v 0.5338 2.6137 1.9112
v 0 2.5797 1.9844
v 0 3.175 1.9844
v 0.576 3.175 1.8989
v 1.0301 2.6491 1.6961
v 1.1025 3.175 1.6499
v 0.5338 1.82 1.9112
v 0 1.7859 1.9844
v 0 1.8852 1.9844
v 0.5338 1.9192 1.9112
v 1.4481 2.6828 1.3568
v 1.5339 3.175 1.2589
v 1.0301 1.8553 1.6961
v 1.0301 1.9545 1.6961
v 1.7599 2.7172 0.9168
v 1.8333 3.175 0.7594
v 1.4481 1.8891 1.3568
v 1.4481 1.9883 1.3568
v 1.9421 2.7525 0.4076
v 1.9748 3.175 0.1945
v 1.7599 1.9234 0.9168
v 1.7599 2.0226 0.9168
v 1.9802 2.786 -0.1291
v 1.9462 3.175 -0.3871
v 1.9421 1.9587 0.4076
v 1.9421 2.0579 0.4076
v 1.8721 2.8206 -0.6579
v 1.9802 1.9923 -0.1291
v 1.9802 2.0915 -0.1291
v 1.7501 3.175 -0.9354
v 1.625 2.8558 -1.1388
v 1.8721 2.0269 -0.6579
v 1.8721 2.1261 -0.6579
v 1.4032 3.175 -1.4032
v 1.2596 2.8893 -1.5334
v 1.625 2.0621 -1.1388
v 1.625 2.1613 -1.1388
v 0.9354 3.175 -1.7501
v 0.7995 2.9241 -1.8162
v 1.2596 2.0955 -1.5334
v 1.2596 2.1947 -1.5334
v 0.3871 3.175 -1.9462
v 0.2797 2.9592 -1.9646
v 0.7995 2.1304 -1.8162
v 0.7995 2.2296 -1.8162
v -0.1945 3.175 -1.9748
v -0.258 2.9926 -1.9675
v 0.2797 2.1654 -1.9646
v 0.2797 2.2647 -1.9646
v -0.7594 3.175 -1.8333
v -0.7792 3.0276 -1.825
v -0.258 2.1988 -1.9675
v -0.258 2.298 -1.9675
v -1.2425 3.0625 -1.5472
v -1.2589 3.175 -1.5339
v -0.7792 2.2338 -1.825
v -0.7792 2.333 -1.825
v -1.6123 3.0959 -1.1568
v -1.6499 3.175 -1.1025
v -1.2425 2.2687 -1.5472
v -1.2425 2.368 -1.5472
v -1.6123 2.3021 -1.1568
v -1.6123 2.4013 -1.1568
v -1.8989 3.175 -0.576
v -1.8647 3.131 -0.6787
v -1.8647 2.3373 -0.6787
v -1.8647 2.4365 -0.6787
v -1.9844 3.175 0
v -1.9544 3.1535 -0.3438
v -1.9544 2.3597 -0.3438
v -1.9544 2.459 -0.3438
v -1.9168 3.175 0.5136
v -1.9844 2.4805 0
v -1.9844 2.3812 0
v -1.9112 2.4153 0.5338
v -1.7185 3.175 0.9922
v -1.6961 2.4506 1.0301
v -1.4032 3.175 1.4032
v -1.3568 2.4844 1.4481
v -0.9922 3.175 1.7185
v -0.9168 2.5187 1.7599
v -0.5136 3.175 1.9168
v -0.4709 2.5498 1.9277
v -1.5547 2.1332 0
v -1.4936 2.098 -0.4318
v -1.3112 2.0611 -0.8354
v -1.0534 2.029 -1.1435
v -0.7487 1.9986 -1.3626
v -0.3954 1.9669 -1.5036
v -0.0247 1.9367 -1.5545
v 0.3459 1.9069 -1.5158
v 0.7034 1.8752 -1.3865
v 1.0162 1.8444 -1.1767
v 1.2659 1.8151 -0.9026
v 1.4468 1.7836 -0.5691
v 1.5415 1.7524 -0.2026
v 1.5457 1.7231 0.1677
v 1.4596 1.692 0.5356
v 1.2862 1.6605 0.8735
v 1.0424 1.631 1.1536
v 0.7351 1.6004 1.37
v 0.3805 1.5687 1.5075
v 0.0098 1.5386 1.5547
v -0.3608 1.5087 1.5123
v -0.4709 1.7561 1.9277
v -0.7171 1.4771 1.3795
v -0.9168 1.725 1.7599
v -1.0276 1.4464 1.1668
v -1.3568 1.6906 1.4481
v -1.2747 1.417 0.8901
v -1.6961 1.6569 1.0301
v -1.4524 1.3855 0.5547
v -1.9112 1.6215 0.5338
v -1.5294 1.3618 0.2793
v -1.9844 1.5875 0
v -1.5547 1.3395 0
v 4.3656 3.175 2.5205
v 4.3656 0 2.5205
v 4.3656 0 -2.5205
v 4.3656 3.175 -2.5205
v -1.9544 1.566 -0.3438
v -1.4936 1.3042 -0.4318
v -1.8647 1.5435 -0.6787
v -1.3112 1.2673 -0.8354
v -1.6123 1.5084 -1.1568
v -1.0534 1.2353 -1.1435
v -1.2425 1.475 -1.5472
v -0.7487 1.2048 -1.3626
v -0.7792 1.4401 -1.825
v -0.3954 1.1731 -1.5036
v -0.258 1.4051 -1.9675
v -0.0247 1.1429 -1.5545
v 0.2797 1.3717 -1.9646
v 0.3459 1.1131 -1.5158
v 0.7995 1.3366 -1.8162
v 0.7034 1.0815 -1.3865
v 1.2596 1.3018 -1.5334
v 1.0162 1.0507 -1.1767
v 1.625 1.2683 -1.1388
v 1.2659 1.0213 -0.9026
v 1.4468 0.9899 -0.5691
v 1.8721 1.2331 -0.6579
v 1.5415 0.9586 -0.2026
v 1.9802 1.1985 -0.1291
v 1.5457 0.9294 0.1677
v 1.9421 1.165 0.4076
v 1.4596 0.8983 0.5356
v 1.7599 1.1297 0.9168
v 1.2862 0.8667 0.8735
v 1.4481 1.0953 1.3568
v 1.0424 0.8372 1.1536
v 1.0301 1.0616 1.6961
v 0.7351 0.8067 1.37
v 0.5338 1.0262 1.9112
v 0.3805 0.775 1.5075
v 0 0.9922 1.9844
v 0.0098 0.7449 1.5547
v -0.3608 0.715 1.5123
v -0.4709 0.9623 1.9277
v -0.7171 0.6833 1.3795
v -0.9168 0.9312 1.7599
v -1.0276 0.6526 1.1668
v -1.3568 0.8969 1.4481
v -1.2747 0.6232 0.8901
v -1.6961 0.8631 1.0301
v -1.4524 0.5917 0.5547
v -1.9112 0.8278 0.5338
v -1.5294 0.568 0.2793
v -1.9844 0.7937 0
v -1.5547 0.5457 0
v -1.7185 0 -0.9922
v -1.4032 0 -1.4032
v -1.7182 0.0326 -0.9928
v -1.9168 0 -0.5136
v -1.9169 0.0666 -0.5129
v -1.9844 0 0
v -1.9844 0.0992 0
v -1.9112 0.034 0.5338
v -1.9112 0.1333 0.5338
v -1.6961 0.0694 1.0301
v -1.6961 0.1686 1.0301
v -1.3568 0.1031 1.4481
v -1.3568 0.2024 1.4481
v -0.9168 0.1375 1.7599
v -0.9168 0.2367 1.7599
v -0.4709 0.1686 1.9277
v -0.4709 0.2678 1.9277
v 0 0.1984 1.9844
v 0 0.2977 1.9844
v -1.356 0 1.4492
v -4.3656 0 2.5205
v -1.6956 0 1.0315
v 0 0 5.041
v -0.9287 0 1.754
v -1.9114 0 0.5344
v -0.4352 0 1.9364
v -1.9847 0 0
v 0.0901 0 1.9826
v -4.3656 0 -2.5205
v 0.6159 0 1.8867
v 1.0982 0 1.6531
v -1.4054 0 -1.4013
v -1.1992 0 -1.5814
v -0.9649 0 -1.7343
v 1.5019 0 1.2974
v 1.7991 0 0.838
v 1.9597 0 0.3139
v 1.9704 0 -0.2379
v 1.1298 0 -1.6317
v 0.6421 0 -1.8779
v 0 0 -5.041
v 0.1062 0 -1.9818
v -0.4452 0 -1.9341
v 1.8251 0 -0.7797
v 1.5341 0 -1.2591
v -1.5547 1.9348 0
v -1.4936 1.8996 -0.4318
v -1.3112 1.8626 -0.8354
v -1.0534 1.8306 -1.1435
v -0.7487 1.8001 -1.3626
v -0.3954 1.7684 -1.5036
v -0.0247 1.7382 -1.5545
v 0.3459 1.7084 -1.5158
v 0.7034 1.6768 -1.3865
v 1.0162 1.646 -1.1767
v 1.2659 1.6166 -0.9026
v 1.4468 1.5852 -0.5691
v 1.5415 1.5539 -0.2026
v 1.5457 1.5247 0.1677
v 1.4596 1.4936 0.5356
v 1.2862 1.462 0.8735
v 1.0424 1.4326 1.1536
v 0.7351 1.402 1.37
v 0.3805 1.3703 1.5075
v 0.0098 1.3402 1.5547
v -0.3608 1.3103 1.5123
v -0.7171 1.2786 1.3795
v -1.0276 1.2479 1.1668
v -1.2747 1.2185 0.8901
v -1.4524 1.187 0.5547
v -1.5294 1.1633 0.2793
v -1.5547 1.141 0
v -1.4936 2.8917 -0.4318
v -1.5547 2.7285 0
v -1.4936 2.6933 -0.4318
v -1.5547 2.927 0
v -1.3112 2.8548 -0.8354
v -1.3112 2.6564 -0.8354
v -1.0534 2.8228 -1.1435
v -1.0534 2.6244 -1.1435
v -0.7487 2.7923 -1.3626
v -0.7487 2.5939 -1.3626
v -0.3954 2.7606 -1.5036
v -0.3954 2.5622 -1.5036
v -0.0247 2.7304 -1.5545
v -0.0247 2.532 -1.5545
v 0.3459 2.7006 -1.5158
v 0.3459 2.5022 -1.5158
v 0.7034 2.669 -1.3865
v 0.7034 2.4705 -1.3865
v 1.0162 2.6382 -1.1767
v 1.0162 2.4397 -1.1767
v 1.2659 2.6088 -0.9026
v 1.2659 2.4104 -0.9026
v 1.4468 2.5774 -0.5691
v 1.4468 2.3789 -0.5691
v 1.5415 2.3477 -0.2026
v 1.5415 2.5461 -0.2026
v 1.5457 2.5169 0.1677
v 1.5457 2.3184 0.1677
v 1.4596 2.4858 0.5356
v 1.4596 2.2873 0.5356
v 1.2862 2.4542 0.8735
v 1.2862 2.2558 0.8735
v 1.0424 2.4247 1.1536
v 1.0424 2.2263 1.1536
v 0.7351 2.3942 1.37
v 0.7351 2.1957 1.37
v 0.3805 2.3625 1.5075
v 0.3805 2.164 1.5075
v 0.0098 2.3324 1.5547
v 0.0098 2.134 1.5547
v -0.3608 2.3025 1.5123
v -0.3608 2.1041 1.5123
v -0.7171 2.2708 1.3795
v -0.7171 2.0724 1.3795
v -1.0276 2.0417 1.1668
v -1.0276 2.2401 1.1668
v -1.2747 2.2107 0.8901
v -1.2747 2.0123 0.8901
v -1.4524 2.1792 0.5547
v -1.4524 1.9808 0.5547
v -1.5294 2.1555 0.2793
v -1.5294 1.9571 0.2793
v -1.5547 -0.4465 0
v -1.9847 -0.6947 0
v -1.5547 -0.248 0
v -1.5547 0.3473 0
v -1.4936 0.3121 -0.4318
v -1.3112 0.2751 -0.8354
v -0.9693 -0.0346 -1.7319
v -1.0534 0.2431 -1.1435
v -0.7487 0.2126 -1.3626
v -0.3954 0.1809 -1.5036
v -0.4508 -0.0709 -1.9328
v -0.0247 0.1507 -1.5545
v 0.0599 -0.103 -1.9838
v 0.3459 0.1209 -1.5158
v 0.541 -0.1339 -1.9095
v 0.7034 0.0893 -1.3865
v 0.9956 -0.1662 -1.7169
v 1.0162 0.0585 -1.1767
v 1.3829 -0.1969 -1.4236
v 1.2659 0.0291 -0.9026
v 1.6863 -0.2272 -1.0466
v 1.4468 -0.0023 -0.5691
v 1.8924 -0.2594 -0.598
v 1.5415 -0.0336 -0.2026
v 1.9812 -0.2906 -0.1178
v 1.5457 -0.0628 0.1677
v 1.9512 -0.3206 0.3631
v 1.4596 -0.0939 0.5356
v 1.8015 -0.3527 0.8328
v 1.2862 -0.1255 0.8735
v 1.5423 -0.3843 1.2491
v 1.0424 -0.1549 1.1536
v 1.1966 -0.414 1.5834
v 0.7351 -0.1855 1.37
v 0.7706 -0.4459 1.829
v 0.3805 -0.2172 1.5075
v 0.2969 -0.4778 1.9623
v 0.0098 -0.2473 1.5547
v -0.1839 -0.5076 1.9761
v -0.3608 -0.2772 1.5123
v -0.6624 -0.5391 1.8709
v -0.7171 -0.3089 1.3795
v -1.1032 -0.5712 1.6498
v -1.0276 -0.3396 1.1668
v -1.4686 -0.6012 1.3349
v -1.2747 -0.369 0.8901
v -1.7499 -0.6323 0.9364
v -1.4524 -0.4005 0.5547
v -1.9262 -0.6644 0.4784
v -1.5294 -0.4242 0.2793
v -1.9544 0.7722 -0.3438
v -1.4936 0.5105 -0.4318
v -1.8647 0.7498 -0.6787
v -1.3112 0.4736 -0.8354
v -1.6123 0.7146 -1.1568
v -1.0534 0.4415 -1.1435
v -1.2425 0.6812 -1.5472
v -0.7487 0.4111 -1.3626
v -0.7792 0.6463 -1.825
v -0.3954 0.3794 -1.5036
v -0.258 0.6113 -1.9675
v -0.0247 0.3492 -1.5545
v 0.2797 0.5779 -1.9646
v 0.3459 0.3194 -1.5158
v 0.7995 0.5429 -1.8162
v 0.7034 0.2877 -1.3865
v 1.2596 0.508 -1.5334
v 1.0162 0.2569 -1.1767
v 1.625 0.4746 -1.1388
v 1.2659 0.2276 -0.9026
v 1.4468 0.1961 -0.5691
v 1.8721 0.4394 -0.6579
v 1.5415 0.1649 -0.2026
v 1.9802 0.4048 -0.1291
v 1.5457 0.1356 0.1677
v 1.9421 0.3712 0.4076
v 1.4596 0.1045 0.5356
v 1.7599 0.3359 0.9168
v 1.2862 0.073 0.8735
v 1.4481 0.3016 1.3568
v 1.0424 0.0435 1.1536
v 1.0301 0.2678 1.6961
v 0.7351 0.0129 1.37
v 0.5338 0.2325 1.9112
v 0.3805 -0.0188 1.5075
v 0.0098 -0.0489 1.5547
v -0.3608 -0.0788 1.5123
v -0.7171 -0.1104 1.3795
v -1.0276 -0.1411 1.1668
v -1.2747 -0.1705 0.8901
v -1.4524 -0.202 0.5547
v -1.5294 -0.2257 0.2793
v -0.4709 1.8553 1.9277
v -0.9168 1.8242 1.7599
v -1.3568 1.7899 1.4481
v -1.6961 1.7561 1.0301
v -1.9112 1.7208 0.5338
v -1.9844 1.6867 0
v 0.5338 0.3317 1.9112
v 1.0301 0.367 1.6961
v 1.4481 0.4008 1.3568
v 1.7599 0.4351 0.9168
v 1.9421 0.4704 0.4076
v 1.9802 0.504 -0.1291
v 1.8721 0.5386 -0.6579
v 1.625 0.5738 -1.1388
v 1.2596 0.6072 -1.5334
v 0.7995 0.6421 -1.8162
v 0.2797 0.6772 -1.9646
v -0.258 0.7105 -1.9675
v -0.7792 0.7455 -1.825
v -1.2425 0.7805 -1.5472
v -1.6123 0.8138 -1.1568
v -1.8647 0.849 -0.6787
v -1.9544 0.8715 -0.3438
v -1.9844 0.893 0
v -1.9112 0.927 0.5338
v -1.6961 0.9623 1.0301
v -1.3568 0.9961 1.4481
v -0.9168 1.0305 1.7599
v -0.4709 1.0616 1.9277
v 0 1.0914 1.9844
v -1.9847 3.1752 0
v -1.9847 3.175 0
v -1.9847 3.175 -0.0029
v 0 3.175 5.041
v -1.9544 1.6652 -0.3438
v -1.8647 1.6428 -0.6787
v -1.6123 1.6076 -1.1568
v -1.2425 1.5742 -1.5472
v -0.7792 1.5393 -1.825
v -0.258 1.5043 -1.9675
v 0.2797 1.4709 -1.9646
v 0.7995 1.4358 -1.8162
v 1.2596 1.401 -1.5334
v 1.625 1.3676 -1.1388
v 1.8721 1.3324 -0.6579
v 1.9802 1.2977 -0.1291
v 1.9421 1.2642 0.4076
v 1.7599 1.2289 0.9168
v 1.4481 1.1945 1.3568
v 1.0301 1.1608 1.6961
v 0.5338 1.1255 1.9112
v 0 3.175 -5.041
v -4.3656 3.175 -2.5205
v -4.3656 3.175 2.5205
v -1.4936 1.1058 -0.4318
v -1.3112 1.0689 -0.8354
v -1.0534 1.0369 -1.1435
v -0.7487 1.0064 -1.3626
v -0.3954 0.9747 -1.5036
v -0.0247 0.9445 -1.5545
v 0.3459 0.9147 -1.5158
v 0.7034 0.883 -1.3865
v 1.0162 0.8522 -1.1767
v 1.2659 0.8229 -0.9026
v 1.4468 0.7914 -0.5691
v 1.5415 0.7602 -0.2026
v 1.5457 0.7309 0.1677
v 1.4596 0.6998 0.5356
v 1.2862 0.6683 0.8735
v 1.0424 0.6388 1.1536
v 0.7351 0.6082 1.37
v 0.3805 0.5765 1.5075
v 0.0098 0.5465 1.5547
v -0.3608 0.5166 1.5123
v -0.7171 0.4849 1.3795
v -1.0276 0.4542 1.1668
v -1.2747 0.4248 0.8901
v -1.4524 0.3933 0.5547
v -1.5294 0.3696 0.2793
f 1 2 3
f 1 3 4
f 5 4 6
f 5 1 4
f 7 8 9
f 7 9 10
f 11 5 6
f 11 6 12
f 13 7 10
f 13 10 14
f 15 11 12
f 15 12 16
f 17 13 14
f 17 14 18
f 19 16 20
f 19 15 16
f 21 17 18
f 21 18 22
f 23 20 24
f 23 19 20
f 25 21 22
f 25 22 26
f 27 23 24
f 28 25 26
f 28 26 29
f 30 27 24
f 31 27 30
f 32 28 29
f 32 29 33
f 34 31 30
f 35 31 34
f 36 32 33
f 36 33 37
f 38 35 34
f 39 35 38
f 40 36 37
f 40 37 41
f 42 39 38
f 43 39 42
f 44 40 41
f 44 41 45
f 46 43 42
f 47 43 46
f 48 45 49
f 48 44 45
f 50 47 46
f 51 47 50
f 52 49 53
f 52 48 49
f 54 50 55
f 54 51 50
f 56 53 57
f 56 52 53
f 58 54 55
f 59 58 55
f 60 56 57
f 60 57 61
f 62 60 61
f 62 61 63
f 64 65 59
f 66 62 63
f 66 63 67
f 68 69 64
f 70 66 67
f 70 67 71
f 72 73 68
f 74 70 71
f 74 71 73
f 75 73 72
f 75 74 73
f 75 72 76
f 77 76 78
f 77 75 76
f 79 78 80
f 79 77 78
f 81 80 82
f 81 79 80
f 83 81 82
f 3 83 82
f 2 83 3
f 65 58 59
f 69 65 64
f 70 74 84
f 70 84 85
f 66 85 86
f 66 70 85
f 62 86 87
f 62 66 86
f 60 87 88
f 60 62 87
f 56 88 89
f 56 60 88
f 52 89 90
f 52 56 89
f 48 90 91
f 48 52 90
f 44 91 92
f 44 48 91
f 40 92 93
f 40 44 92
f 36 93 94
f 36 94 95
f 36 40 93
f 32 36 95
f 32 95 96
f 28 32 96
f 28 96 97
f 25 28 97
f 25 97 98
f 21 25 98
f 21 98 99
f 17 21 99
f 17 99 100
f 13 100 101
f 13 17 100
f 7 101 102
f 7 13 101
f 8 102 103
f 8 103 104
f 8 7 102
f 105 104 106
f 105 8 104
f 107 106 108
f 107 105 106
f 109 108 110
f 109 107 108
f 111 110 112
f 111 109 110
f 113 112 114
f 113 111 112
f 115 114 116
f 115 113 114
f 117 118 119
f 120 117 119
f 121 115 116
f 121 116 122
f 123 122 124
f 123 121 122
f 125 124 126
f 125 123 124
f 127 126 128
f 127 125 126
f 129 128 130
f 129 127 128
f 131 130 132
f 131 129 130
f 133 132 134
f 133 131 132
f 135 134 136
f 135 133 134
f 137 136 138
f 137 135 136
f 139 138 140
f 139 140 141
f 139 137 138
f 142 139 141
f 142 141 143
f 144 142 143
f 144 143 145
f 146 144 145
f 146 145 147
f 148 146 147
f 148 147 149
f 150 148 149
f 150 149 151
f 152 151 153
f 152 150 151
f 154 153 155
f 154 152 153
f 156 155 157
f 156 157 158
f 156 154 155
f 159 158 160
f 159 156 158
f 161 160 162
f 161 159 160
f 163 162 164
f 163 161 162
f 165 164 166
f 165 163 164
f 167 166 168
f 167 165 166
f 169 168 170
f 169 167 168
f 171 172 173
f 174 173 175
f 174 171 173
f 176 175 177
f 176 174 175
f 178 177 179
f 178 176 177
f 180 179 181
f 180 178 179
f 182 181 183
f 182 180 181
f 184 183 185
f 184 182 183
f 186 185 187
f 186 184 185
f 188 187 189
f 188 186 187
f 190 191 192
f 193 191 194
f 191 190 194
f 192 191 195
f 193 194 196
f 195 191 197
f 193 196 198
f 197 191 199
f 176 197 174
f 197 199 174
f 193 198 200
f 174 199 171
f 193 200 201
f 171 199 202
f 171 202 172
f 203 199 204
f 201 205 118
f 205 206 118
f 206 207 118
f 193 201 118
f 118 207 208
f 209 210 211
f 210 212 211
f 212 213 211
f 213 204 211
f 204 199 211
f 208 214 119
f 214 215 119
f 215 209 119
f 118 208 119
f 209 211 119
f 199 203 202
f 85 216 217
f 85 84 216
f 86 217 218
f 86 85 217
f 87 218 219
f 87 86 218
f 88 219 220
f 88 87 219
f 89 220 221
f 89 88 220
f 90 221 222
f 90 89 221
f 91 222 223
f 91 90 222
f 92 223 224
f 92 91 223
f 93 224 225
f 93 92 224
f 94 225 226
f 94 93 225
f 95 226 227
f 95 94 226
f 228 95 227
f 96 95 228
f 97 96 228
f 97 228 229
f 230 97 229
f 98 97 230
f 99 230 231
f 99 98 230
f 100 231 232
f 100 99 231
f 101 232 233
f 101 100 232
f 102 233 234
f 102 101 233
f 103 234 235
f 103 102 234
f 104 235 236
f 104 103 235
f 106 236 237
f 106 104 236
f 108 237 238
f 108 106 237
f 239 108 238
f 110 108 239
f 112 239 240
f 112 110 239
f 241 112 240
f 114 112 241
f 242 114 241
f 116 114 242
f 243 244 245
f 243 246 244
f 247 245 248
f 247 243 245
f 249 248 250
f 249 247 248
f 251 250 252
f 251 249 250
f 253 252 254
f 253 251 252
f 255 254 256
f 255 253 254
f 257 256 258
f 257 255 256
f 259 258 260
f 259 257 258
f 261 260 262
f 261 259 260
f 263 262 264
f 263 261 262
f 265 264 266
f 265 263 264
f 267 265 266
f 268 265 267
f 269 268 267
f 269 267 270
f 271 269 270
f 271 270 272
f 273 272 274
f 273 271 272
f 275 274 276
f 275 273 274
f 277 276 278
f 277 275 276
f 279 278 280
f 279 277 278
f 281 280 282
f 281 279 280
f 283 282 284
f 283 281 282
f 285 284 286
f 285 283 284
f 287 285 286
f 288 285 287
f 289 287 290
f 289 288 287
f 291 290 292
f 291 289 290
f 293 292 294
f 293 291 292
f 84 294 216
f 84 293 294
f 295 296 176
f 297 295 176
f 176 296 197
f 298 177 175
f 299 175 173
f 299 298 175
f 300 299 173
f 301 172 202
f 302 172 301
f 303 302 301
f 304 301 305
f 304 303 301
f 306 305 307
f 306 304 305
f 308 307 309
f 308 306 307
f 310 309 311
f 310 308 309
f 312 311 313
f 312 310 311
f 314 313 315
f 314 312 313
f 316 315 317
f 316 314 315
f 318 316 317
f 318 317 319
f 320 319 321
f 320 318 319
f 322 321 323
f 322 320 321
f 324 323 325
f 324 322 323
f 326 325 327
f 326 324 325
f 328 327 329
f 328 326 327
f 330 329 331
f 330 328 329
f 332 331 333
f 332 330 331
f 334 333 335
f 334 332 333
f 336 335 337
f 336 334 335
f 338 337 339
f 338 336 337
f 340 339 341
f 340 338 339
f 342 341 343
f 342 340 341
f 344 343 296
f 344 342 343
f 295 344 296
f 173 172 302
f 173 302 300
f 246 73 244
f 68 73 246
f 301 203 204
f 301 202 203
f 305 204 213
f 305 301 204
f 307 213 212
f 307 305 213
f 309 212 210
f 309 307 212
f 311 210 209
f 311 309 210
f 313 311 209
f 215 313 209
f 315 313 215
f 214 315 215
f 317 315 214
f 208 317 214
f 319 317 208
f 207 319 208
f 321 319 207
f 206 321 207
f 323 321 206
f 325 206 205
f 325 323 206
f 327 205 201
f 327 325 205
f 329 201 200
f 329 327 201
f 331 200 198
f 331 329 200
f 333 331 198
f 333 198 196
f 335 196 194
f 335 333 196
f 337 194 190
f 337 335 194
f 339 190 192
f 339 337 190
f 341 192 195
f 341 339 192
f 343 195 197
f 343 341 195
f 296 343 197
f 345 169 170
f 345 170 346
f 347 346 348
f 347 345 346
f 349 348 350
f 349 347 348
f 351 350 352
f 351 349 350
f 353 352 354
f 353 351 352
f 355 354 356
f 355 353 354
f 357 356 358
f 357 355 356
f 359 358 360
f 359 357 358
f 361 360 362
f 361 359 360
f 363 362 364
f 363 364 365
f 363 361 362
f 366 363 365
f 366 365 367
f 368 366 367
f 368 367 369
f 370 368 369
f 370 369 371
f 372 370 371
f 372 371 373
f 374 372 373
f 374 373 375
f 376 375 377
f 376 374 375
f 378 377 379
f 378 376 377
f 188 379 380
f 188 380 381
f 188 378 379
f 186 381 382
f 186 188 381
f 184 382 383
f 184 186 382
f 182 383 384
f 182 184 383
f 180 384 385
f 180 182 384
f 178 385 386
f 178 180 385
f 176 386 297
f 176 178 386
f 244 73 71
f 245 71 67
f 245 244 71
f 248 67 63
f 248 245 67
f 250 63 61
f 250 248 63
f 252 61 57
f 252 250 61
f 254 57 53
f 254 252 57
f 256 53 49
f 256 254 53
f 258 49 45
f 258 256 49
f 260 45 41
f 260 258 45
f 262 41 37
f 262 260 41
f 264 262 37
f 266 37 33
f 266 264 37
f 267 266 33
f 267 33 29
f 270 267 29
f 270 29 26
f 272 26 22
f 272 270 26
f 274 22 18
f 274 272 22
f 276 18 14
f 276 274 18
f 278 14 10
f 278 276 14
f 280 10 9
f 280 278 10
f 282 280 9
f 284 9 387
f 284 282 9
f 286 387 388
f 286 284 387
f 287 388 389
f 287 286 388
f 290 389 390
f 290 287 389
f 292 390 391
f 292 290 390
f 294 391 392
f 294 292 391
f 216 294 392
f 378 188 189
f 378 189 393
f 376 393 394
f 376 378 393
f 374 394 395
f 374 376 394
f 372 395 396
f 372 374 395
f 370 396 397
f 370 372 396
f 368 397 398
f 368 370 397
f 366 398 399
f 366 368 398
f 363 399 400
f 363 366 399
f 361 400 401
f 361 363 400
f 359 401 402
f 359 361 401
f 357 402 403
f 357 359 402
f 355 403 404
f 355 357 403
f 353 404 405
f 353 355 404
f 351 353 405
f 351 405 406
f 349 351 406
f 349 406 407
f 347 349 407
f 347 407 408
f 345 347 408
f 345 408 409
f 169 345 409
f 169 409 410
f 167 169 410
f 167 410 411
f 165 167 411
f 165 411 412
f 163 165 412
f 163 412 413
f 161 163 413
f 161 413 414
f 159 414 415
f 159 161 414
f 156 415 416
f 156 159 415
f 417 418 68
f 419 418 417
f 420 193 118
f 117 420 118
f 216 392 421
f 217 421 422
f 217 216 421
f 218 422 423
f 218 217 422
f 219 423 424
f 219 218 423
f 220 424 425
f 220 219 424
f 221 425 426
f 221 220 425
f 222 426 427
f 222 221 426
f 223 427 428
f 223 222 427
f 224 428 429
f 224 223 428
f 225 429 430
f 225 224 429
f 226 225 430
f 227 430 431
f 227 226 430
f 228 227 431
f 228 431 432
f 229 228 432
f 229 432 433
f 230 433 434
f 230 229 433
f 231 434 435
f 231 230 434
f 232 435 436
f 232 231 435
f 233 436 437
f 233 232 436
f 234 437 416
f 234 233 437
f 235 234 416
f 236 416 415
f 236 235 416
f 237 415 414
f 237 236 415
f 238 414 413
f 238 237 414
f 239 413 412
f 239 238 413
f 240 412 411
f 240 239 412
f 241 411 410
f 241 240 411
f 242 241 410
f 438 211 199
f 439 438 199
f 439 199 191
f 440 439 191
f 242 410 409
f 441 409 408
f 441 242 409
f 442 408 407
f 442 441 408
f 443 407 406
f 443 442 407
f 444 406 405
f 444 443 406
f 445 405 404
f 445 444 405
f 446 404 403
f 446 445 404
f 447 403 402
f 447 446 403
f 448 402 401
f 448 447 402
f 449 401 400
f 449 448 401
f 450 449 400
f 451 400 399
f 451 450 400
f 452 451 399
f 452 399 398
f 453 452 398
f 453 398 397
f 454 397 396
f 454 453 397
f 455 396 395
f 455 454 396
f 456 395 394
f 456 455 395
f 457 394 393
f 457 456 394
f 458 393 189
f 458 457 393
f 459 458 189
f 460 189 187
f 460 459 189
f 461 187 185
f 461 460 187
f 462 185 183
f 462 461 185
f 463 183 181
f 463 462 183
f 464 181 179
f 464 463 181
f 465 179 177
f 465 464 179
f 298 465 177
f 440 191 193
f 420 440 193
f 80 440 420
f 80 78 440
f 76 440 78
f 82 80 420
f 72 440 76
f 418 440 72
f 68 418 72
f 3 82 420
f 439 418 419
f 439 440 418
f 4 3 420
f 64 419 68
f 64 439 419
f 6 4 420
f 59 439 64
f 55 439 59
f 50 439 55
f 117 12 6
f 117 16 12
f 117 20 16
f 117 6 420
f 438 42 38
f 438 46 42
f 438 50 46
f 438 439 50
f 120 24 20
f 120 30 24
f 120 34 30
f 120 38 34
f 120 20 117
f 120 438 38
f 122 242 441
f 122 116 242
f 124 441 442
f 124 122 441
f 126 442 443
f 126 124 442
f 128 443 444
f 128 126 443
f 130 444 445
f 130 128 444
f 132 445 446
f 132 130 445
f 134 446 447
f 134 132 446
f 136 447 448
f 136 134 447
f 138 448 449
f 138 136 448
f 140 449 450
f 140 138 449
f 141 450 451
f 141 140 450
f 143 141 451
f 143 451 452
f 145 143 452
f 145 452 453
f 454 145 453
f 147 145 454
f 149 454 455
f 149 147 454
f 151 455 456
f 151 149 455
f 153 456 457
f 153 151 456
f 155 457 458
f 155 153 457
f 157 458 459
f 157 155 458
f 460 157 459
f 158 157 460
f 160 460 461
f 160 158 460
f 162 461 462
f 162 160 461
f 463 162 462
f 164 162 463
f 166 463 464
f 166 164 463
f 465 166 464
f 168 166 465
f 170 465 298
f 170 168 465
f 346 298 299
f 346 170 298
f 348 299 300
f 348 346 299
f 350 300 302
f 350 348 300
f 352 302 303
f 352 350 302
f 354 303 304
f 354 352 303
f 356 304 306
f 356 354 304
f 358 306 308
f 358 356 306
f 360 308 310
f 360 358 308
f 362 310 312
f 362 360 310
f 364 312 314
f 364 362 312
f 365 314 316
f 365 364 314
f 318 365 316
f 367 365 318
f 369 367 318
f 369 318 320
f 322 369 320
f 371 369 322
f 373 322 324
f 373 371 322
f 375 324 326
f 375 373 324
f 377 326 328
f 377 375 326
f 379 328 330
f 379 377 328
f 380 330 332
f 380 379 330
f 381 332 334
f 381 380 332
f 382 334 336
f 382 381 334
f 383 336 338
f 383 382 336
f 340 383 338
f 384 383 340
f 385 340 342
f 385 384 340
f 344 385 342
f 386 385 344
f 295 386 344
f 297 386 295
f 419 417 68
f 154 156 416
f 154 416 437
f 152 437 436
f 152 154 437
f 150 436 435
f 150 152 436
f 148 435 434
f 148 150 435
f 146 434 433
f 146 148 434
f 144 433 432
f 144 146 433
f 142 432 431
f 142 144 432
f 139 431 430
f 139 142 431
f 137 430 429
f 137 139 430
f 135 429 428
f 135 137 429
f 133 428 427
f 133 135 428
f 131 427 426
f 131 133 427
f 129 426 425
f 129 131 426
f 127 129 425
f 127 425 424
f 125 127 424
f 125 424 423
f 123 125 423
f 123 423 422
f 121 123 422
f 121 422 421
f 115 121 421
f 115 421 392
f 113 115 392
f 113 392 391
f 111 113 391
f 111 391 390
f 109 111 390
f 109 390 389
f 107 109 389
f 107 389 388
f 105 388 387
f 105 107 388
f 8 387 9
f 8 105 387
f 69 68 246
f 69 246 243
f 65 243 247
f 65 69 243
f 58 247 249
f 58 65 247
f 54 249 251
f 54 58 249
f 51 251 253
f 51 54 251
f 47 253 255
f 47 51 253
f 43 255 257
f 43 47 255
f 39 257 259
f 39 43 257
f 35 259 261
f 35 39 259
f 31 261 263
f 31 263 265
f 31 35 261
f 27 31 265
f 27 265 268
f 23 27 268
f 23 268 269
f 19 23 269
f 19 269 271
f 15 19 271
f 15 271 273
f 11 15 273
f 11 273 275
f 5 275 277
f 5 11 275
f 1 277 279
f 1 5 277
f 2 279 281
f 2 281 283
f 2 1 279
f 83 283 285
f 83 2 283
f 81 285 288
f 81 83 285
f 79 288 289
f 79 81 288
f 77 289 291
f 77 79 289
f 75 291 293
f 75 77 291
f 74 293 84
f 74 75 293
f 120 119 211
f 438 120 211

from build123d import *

# Parameters (mm, degrees)
SKETCH1_R           = 1.984375
BOSS_EXTRUDE1_DEPTH = 3.175
THREAD1_PITCH       = 0.79375


with BuildPart() as part:
    # Sketch1 → Boss-Extrude1 (new body)
    with BuildSketch(Plane(origin=(0, 0, 0), x_dir=(1, 0, 0), z_dir=(0, 1, 0))):
        Polygon((0, 5.040989538), (-4.365625, 2.520494769), (-4.365625, -2.520494769), (0, -5.040989538), (4.365625, -2.520494769), (4.365625, 2.520494769), align=None)
        with Locations(Location((0, 0, 0), (0, 0, 270))):
            Circle(SKETCH1_R, mode=Mode.SUBTRACT)
    extrude(amount=BOSS_EXTRUDE1_DEPTH)

    # Thread1: the profile of Thread Profile1 profile screwed along a right-hand helix of 4 turns, 8 arcs to a turn; built about Z, then put on its axis
    thread1_z = Axis((0, 0, 0), (0, 0, 1))
    thread1_corners = [(1.984675, 0, -0.000173205), (1.984675, 0, 0.694704453), (1.554745212, 0, 0.446484374), (1.554745212, 0, 0.248046874)]
    with BuildLine(mode=Mode.PRIVATE) as thread1_profile:
        Line(thread1_corners[0], thread1_corners[1])
        Line(thread1_corners[1], thread1_corners[2])
        Line(thread1_corners[2], thread1_corners[3])
        Line(thread1_corners[3], thread1_corners[0])
    thread1_cap = Face(thread1_profile.wire())
    thread1_turn_angles = [0, 22.5, 45, 67.5, 90, 112.5, 135, 157.5, 180, 202.5, 225, 247.5, 270, 292.5, 315, 337.5, 360]
    thread1_turn_weights = [1, 0.9238795325112867, 1, 0.9238795325112867, 1, 0.9238795325112867, 1, 0.9238795325112867, 1, 0.9238795325112867, 1, 0.9238795325112867, 1, 0.9238795325112867, 1, 0.9238795325112867, 1]
    thread1_turn_rails = [Edge.make_bspline([Vector(p[0], p[1], 0).rotate(thread1_z, thread1_turn_angles[k]) / thread1_turn_weights[k] + Vector(0, 0, p[2] + THREAD1_PITCH * thread1_turn_angles[k] / 360) for k in range(17)], [0, 0, 0, 1, 1, 2, 2, 3, 3, 4, 4, 5, 5, 6, 6, 7, 7, 8, 8, 8], 2, thread1_turn_weights) for p in thread1_corners]
    thread1_turn_sides = [Face.make_surface_from_curves(thread1_turn_rails[p[0]], thread1_turn_rails[p[1]]) for p in [(0, 1), (1, 2), (2, 3), (3, 0)]]
    thread1 = Plane(origin=(0, 3.175, 0), x_dir=(-1, 0, 0), z_dir=(0, -1, 0)) * Solid(Shell([*[p.moved(Location((0, 0, THREAD1_PITCH * i))) for i in range(4) for p in thread1_turn_sides], thread1_cap, thread1_cap.rotate(thread1_z, 1440).moved(Location((0, 0, THREAD1_PITCH * 1440 / 360)))]))
    add(thread1)


solid = part.part
